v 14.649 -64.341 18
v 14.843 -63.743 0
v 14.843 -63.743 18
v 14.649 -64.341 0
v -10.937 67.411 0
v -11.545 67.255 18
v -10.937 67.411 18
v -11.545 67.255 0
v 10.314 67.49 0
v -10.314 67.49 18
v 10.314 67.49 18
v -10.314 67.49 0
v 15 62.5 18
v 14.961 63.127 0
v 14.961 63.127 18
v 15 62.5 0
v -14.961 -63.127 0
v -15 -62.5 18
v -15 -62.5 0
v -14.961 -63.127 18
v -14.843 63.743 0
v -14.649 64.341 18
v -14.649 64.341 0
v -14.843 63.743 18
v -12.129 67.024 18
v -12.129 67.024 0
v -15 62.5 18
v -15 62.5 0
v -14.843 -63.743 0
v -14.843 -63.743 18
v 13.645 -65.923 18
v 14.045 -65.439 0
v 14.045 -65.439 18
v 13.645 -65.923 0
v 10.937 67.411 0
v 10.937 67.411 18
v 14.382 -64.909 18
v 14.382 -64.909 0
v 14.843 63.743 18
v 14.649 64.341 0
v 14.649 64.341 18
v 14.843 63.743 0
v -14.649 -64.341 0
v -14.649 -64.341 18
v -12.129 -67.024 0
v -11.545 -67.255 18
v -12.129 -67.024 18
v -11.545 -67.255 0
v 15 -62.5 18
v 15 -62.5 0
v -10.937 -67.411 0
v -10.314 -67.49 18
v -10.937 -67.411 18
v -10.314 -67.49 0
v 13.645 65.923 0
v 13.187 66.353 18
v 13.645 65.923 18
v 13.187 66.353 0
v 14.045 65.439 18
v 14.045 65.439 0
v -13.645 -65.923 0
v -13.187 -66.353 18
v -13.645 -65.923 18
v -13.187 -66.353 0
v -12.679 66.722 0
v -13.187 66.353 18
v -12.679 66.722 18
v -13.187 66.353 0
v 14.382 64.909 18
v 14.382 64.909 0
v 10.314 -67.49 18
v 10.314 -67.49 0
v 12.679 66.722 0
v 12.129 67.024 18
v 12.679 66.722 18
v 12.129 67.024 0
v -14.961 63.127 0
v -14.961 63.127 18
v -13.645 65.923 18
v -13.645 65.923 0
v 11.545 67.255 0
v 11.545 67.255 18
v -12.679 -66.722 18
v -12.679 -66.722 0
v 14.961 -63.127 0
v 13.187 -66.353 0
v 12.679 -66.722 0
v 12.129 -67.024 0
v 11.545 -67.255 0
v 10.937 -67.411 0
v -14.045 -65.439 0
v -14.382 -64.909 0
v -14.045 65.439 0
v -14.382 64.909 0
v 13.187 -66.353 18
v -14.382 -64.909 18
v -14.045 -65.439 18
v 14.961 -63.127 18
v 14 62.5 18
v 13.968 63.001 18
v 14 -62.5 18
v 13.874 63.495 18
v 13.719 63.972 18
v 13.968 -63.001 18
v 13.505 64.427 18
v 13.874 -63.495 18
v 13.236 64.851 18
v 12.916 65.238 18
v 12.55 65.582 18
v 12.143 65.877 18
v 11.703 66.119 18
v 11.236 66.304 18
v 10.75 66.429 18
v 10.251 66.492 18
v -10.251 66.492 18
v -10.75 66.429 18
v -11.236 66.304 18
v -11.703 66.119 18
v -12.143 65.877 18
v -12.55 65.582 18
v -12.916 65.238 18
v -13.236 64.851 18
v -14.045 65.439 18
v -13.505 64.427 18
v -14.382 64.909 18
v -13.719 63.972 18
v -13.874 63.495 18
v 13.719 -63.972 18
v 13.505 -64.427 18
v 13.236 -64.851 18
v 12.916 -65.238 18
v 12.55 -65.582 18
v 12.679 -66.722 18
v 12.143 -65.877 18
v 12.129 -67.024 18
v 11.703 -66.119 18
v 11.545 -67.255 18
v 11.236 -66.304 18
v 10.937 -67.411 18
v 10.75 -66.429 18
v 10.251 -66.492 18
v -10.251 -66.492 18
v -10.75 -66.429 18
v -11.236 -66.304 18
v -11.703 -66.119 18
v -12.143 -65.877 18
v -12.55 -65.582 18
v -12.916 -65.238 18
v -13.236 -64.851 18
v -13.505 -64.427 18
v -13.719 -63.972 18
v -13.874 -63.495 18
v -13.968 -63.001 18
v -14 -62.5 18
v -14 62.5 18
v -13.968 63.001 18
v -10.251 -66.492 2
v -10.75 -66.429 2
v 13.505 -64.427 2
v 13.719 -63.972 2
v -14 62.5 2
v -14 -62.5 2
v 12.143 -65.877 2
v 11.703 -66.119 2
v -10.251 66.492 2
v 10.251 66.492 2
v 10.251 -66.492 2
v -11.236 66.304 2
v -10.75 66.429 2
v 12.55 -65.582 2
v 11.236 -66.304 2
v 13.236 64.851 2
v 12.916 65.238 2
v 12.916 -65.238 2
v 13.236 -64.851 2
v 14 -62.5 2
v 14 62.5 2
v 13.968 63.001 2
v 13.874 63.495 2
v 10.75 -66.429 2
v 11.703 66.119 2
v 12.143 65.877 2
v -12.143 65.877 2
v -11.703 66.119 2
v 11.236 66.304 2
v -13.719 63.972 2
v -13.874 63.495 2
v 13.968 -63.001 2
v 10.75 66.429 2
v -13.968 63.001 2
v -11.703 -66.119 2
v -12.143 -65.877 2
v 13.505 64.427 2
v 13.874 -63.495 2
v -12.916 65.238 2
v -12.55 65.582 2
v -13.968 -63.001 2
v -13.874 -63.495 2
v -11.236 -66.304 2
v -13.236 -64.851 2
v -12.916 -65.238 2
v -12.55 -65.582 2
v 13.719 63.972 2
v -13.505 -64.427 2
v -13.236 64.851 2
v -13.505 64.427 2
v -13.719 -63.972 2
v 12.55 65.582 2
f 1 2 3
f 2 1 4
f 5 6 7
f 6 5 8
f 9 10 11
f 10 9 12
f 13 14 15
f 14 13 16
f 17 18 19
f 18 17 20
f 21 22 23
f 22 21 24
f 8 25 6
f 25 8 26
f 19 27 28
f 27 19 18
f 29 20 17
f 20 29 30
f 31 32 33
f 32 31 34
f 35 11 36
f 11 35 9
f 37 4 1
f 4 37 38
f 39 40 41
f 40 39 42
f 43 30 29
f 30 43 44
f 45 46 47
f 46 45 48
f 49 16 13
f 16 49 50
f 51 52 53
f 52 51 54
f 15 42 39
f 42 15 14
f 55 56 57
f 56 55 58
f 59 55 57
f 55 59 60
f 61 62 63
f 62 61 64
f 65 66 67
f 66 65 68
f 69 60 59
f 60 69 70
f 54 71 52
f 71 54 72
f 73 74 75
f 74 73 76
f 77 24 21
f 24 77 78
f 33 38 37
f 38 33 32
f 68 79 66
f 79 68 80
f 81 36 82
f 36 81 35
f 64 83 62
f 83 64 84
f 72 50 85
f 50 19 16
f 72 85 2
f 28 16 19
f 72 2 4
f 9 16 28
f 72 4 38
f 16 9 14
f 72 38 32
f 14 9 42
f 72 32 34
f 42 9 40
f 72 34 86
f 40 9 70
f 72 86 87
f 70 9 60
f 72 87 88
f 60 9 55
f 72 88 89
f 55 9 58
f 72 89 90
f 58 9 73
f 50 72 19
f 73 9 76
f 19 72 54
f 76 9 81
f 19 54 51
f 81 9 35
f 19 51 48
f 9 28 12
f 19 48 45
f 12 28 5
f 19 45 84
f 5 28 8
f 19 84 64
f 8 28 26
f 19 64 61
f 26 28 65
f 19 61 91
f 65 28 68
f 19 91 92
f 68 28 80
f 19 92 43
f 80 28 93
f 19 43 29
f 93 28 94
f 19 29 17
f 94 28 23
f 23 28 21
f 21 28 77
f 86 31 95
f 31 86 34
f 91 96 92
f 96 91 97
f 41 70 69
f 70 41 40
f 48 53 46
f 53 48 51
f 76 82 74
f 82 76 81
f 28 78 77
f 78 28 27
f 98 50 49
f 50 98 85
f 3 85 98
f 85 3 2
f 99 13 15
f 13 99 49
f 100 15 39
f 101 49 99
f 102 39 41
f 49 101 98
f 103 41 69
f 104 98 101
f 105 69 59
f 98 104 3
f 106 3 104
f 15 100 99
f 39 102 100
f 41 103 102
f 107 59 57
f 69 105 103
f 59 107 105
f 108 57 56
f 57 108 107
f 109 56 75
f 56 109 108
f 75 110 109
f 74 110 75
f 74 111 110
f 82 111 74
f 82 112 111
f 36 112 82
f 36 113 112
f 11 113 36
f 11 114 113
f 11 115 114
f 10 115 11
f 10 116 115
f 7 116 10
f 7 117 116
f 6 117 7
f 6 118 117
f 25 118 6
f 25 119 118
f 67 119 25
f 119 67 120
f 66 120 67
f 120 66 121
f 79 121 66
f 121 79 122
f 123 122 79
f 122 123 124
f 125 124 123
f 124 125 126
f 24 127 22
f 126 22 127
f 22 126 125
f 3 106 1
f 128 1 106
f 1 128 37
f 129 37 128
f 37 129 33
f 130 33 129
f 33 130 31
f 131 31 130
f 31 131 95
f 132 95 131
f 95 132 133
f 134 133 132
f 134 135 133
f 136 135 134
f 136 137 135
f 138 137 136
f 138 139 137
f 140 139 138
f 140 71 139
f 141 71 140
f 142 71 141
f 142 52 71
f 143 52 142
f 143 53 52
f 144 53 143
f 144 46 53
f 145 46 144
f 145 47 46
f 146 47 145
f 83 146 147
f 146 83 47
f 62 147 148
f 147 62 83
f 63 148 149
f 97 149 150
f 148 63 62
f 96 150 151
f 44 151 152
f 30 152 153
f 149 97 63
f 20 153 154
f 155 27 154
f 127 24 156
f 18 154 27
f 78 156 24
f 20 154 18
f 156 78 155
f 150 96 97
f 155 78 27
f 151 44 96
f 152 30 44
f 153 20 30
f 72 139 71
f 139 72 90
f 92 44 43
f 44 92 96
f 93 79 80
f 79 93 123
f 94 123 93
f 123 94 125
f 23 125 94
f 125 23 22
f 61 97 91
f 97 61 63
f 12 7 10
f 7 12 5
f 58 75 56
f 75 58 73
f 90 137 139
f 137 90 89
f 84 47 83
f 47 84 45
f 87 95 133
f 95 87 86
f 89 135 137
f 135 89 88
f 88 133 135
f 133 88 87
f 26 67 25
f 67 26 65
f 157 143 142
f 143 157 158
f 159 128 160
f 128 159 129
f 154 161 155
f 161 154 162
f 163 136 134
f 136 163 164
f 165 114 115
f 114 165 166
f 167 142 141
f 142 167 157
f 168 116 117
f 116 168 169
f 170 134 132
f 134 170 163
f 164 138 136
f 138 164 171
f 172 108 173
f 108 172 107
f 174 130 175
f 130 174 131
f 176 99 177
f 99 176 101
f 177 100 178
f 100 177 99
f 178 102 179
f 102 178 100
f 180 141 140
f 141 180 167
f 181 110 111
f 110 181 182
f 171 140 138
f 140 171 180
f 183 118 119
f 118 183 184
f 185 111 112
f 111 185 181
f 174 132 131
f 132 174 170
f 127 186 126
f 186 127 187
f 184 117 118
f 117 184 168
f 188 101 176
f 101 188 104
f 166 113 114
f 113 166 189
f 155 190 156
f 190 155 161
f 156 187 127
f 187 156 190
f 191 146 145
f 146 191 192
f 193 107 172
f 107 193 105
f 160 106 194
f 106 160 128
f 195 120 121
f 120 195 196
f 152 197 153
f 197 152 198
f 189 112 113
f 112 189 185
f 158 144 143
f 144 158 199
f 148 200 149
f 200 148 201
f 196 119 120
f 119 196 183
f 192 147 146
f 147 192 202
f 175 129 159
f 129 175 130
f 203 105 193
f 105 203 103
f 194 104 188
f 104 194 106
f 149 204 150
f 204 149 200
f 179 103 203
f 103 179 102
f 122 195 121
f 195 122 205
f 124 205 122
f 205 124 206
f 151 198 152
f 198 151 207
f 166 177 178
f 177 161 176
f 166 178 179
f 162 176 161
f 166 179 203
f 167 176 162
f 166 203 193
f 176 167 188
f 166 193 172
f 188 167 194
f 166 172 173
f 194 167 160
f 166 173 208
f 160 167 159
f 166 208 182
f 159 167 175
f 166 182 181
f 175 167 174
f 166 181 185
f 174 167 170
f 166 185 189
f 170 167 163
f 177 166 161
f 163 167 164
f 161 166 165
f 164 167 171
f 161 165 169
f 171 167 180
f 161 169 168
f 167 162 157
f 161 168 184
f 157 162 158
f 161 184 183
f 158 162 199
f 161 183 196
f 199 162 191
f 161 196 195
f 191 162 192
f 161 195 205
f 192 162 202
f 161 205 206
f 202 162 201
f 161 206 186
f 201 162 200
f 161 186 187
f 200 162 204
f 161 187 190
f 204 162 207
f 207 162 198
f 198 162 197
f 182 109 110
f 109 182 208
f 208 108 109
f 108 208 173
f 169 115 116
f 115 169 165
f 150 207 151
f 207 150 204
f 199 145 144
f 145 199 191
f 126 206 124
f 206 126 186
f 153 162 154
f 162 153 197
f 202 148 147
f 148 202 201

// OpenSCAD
$fn = 50;


difference() {
	union() {
		hull() {
			translate(v = [-10.0000000000, 62.5000000000, 0]) {
				cylinder(h = 18, r = 5);
			}
			translate(v = [10.0000000000, 62.5000000000, 0]) {
				cylinder(h = 18, r = 5);
			}
			translate(v = [-10.0000000000, -62.5000000000, 0]) {
				cylinder(h = 18, r = 5);
			}
			translate(v = [10.0000000000, -62.5000000000, 0]) {
				cylinder(h = 18, r = 5);
			}
		}
	}
	union() {
		translate(v = [0, 0, 2]) {
			hull() {
				translate(v = [-10.0000000000, 62.5000000000, 0]) {
					cylinder(h = 16, r = 4);
				}
				translate(v = [10.0000000000, 62.5000000000, 0]) {
					cylinder(h = 16, r = 4);
				}
				translate(v = [-10.0000000000, -62.5000000000, 0]) {
					cylinder(h = 16, r = 4);
				}
				translate(v = [10.0000000000, -62.5000000000, 0]) {
					cylinder(h = 16, r = 4);
				}
			}
		}
	}
}
